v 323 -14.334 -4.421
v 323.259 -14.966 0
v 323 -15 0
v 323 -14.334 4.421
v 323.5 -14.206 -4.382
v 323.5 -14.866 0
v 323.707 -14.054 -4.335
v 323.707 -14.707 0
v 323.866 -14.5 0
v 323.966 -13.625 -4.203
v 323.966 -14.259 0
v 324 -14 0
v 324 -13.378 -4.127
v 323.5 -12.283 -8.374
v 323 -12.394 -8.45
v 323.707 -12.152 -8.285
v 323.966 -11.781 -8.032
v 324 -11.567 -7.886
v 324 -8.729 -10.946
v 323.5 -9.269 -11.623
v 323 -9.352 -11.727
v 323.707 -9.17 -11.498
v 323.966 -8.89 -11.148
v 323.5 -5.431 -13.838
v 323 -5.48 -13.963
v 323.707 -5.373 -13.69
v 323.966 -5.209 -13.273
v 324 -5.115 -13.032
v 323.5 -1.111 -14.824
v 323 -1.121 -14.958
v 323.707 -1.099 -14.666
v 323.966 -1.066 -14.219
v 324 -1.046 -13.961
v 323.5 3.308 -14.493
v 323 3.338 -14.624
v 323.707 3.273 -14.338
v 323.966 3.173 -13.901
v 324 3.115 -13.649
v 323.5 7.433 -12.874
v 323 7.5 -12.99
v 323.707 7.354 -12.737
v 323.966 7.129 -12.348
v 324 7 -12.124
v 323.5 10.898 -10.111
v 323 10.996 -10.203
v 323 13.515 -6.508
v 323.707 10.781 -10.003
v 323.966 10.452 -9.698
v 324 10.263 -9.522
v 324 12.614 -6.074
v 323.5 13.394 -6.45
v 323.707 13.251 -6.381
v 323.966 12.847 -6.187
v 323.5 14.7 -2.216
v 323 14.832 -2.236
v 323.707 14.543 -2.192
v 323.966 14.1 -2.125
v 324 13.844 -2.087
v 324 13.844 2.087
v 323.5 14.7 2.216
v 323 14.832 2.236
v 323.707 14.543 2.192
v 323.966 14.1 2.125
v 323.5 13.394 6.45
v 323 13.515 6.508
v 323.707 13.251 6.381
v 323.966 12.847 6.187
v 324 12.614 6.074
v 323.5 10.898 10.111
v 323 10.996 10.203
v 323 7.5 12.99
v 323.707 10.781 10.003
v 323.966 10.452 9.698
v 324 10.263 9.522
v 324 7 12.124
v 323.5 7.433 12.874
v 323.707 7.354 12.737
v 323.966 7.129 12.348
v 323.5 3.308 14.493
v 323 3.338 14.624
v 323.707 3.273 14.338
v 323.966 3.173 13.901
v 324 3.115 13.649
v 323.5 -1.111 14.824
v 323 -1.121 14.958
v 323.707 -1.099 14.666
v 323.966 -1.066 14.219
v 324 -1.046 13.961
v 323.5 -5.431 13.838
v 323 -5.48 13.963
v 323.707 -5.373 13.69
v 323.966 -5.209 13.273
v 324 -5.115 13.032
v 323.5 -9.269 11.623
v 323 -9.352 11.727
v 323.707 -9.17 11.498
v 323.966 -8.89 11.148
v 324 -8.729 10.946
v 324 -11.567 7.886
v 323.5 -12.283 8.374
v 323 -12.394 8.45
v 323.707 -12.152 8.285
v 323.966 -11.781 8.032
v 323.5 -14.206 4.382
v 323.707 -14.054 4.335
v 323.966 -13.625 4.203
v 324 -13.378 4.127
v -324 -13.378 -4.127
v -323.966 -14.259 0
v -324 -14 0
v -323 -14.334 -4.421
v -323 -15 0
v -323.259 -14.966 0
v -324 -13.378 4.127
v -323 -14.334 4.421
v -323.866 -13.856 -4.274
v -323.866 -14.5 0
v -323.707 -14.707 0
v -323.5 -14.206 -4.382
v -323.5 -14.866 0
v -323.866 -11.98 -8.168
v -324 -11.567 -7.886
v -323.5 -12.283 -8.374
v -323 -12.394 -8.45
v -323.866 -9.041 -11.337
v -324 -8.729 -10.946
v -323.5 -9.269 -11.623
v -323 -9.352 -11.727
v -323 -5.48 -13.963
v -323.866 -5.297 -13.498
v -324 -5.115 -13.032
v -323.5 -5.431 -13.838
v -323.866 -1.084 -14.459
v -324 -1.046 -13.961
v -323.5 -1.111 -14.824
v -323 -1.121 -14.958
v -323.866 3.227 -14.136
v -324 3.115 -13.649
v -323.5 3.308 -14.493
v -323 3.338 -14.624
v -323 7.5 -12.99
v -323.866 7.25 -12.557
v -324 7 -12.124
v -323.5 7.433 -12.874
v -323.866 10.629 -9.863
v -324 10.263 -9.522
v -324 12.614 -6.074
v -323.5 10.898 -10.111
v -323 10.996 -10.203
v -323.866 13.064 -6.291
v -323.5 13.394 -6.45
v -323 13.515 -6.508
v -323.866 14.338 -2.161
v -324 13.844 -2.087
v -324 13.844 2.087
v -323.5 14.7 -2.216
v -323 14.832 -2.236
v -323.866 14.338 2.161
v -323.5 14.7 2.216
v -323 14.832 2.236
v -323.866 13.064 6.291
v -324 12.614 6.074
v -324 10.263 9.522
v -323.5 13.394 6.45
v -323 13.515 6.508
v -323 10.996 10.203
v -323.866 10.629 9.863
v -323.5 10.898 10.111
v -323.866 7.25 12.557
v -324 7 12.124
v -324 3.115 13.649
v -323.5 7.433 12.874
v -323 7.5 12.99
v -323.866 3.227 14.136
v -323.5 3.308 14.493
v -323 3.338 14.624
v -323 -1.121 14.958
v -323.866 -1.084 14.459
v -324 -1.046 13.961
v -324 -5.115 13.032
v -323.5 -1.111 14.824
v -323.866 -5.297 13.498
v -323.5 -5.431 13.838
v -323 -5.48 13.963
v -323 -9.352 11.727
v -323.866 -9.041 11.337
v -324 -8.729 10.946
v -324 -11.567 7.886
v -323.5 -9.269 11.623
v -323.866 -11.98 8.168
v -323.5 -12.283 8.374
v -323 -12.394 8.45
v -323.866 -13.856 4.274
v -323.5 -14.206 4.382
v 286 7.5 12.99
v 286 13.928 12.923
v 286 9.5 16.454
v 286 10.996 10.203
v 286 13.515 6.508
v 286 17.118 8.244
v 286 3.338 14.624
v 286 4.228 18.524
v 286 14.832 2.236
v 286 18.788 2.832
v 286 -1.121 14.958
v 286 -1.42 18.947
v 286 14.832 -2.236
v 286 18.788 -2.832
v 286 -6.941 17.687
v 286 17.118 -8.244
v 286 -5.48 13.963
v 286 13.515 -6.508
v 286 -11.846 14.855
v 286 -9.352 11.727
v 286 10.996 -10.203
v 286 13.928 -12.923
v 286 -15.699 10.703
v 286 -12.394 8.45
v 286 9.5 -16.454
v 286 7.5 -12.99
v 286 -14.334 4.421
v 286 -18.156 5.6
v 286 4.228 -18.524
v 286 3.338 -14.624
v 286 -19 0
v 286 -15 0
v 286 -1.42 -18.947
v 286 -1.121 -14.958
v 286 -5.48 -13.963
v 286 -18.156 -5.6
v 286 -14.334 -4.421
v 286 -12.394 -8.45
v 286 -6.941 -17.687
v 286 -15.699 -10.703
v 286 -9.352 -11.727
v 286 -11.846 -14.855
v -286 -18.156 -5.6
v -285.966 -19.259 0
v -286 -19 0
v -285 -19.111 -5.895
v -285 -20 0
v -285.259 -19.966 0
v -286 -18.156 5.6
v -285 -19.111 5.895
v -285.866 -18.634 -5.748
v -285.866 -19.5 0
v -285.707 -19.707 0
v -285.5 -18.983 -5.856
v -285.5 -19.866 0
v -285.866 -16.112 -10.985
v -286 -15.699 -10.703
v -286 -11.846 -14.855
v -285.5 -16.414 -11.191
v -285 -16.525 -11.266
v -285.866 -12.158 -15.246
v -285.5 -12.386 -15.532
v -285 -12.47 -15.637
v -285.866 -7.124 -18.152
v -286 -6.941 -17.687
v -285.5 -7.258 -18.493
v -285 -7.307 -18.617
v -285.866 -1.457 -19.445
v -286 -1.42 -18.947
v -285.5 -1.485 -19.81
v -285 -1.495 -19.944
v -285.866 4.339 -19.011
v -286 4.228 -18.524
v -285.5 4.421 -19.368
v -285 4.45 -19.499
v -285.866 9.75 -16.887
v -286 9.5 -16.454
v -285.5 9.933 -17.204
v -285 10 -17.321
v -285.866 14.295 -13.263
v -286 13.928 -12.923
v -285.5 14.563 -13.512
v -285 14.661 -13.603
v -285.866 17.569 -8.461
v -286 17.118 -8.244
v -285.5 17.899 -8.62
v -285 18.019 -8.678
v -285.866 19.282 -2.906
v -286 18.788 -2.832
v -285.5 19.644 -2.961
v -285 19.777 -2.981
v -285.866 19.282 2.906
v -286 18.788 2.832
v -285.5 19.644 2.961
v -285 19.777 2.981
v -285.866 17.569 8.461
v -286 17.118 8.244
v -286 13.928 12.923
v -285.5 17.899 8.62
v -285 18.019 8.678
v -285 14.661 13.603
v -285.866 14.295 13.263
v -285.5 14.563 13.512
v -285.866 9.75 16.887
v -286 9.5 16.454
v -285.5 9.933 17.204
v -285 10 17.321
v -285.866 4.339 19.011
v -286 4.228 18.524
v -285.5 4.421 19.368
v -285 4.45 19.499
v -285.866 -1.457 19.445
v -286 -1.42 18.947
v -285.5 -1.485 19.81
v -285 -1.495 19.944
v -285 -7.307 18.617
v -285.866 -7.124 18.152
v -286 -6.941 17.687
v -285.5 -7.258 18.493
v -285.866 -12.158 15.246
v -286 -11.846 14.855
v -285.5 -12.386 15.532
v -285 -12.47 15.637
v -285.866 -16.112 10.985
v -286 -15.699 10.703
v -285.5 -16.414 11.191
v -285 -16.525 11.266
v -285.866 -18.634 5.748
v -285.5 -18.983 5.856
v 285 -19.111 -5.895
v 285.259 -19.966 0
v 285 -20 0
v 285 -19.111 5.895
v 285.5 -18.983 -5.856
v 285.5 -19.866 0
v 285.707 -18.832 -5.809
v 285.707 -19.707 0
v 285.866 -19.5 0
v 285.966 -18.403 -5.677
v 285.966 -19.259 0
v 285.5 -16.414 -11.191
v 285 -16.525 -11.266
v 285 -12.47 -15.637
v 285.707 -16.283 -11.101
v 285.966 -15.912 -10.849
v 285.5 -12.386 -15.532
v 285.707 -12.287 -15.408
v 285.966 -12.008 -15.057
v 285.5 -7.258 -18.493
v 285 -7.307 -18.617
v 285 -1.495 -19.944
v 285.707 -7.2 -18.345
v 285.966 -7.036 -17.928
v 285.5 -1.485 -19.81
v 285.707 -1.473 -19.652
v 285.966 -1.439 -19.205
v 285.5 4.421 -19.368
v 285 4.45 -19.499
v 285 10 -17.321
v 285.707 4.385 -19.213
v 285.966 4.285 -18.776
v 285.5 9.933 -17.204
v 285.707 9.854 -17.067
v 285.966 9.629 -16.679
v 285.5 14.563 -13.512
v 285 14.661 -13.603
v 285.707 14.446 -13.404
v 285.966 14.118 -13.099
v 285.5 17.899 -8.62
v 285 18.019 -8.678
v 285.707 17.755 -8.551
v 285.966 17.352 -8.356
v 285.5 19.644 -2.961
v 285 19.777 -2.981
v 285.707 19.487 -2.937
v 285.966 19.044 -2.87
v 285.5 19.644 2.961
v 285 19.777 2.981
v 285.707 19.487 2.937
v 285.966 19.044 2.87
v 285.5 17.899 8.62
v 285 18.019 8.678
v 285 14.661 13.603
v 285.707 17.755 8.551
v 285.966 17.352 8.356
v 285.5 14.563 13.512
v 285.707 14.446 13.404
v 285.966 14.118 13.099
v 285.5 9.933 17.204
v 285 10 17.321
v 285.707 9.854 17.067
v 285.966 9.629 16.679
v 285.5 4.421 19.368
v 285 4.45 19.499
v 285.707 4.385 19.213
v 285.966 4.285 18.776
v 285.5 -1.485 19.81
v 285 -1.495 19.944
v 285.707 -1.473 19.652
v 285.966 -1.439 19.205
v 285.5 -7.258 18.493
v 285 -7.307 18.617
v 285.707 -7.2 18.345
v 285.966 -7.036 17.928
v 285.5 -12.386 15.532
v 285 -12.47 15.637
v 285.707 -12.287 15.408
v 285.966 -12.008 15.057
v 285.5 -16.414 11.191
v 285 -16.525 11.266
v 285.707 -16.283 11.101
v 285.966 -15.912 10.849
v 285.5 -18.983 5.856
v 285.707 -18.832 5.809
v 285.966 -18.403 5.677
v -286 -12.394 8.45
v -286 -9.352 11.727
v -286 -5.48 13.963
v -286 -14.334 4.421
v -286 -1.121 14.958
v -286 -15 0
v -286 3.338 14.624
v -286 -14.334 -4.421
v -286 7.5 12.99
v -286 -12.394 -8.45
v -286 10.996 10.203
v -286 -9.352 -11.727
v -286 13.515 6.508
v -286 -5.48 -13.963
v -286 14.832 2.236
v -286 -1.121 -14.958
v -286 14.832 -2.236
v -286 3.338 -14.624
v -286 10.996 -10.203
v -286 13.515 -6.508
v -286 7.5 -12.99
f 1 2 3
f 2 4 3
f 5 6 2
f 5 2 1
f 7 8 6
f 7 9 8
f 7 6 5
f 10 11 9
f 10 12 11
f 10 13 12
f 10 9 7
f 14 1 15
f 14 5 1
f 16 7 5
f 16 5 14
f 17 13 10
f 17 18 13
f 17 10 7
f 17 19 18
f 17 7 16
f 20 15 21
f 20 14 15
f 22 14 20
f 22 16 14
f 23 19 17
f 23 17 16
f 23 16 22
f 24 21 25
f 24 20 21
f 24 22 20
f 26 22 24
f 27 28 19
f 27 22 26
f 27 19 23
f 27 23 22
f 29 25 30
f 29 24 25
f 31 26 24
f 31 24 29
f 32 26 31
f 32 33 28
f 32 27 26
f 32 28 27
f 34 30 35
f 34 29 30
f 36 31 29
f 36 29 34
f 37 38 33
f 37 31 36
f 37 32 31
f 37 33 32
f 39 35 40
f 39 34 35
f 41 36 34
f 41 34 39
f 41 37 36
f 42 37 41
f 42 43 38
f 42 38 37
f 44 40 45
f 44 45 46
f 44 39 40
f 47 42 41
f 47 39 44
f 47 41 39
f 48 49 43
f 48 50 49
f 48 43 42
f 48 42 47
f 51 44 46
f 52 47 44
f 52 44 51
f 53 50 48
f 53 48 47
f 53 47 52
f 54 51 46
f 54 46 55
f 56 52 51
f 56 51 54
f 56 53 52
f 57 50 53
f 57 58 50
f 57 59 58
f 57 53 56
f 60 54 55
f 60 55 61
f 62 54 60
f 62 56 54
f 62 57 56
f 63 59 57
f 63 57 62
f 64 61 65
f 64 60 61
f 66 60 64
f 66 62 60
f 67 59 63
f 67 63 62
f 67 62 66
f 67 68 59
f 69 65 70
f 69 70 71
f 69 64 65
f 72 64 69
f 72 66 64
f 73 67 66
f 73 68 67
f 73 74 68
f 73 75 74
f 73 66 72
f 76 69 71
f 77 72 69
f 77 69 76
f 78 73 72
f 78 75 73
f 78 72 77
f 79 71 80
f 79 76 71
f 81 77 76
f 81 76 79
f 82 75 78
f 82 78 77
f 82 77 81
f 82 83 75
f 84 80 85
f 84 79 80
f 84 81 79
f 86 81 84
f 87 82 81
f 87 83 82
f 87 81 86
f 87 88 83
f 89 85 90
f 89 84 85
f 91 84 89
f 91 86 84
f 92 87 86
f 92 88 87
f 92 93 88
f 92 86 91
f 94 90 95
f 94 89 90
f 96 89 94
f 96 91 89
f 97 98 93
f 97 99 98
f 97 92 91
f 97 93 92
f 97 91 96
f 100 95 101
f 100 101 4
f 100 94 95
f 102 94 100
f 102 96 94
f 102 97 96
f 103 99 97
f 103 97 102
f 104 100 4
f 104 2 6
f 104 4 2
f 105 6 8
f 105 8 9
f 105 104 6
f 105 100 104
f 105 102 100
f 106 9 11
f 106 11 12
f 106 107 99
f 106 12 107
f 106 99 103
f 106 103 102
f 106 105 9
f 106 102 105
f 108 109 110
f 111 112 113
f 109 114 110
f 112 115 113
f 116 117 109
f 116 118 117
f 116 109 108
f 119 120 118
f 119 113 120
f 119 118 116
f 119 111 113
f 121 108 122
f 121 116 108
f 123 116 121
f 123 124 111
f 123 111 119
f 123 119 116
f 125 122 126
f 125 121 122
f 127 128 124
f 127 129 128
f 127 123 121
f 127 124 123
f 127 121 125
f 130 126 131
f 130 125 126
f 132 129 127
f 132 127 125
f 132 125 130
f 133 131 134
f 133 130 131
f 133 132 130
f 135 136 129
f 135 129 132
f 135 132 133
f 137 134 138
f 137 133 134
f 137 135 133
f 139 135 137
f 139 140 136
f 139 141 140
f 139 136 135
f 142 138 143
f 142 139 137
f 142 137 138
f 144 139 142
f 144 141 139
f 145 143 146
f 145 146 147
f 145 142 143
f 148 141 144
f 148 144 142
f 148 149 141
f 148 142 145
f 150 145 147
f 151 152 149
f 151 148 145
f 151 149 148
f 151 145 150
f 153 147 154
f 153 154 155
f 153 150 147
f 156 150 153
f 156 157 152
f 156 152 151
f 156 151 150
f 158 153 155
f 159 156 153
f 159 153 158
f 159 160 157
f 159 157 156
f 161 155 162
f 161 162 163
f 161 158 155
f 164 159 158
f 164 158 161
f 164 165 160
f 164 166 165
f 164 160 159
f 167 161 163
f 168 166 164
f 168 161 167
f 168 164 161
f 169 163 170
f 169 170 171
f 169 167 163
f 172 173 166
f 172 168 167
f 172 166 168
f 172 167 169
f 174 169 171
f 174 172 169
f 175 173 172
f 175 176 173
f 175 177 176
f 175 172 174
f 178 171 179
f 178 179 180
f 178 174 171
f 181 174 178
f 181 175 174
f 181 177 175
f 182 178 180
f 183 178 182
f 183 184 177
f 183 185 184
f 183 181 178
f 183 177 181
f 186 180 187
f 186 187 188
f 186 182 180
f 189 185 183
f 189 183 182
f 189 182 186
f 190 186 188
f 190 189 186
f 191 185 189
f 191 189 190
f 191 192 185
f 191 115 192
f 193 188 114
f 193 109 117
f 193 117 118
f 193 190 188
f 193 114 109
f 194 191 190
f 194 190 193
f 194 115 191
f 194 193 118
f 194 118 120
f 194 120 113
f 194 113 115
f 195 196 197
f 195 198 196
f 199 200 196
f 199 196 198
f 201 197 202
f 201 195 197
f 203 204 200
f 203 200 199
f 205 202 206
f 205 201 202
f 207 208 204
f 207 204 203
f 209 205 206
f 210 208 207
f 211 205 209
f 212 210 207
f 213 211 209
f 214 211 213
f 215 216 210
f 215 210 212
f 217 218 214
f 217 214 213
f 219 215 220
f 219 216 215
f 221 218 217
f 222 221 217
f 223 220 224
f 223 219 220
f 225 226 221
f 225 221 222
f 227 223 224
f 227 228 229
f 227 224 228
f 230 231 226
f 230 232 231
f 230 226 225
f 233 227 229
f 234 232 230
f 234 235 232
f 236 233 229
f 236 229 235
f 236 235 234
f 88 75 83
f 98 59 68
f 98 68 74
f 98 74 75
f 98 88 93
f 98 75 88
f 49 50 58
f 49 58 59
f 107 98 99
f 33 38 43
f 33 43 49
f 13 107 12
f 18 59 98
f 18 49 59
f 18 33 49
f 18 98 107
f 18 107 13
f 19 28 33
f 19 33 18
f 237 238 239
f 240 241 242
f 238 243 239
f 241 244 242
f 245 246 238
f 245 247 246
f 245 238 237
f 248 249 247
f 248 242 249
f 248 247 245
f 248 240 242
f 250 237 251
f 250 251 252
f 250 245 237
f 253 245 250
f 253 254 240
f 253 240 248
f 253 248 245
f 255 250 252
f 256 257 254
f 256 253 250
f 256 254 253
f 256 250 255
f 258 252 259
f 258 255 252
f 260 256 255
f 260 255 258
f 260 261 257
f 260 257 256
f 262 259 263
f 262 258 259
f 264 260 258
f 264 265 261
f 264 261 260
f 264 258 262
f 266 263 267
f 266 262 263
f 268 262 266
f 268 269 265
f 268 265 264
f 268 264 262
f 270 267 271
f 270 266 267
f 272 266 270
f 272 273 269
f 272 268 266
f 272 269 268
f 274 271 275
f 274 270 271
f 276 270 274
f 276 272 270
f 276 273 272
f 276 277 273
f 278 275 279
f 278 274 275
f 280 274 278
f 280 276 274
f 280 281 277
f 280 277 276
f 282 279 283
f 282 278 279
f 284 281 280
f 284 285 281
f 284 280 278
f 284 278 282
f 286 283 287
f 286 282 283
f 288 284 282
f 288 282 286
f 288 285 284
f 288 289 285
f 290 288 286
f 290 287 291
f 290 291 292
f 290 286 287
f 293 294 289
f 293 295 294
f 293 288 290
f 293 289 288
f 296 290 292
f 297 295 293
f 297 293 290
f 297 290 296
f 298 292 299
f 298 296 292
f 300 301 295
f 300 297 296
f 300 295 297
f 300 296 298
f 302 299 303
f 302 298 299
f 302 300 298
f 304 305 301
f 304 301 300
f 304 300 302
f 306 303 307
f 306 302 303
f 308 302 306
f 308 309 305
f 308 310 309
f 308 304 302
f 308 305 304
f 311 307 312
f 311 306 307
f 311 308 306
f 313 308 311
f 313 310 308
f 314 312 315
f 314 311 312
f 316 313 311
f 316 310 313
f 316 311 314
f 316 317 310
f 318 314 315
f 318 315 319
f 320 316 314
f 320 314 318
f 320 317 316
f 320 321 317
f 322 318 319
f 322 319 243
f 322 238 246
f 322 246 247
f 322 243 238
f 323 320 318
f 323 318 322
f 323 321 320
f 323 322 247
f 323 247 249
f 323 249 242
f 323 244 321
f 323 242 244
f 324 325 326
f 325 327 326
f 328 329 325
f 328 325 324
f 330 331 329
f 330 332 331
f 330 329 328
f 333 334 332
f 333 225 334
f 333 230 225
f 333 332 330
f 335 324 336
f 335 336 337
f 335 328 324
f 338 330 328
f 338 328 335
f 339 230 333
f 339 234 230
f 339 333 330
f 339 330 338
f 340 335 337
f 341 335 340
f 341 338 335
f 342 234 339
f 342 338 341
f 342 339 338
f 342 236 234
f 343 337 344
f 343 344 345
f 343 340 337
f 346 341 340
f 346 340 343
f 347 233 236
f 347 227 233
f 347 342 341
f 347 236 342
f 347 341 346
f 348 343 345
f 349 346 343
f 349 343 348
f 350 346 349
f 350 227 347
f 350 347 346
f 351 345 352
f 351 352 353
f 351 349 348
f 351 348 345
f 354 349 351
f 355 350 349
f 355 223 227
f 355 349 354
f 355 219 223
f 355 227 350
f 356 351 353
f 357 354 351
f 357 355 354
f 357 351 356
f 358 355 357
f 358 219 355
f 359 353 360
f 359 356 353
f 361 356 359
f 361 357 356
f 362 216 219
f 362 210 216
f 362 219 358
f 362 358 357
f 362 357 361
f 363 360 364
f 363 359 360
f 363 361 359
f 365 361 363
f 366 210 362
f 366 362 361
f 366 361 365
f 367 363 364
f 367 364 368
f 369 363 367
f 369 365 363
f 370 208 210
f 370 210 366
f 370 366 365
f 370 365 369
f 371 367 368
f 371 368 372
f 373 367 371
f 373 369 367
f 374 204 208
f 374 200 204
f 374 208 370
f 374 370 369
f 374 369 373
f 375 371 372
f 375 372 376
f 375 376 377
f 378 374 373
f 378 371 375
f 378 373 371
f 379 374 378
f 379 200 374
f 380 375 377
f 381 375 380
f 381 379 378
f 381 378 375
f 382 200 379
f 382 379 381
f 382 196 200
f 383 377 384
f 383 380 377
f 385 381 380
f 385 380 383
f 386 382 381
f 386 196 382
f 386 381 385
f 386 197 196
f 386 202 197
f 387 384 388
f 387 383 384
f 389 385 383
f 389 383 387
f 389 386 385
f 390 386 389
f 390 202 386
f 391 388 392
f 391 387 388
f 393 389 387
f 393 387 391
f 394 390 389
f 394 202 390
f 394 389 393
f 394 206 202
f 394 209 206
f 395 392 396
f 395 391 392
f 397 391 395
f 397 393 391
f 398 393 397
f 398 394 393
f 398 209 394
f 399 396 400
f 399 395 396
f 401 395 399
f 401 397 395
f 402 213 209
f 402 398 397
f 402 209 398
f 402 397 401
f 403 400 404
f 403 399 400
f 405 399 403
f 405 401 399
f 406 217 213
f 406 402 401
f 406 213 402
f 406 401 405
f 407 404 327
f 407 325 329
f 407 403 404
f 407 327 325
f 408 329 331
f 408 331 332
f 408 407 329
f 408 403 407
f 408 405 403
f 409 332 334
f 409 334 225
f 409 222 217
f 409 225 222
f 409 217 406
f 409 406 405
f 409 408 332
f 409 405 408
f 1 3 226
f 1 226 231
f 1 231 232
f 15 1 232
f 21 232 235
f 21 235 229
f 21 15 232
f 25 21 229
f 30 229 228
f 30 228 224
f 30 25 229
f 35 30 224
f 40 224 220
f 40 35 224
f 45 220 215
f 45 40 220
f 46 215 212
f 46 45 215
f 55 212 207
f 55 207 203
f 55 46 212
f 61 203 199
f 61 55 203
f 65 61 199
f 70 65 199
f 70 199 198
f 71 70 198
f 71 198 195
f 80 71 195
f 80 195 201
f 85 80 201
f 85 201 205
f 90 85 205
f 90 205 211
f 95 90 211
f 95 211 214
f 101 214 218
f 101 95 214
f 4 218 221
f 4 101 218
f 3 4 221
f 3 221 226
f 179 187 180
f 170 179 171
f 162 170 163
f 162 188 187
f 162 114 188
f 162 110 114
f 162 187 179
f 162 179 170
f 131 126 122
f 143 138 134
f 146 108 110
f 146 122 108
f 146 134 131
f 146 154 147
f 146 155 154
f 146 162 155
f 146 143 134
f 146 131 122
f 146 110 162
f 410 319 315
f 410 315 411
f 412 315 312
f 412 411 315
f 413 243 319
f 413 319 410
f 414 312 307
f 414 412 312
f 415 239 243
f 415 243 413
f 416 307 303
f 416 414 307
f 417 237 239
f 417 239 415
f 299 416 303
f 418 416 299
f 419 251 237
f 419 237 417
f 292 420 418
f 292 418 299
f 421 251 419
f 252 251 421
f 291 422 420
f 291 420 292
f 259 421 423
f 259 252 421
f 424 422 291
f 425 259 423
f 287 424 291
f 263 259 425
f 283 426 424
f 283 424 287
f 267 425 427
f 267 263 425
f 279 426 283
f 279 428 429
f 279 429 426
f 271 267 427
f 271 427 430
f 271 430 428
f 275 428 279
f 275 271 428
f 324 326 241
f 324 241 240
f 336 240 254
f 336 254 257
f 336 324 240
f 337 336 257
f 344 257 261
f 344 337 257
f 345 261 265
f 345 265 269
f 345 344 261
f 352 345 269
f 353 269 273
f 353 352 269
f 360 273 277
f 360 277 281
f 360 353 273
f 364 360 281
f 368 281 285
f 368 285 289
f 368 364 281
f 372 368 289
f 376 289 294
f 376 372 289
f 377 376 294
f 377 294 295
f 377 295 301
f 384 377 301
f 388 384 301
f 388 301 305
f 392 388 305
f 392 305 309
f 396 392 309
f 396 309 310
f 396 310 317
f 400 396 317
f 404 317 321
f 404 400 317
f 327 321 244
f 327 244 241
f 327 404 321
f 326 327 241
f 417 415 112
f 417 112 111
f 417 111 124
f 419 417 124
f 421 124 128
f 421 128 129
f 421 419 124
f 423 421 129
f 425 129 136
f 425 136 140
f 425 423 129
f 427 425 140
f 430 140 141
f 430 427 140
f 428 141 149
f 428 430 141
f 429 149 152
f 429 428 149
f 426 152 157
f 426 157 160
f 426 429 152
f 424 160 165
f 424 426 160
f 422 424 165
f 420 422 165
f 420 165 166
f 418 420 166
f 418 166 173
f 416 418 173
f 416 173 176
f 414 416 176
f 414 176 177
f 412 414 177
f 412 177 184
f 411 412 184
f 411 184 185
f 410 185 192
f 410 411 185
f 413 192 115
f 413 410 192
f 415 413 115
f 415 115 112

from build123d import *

# Parameters (mm, degrees)
RADYUS1_R = 1


with BuildPart() as part:
    # Çizim1 → Döndür1 (revolve)
    with BuildSketch(Plane.XY, mode=Mode.PRIVATE) as d_nd_r1_sk:
        Polygon((-324, 0), (-324, 15), (-286, 15), (-286, 20), (286, 20), (286, 15), (324, 15), (324, 0), align=None)
    revolve(d_nd_r1_sk.sketch.rotate(Axis((-324, 0, 0), (1, 0, 0)), 180), axis=Axis((-324, 0, 0), (1, 0, 0)))

    # Radyus1
    radyus1_edges = [part.edges().sort_by_distance(p)[0] for p in [
        (324, 15, 0),
        (286, 20, 0),
        (-286, 20, 0),
        (-324, 15, 0),
    ]]
    fillet(radyus1_edges, radius=RADYUS1_R)


solid = part.part
